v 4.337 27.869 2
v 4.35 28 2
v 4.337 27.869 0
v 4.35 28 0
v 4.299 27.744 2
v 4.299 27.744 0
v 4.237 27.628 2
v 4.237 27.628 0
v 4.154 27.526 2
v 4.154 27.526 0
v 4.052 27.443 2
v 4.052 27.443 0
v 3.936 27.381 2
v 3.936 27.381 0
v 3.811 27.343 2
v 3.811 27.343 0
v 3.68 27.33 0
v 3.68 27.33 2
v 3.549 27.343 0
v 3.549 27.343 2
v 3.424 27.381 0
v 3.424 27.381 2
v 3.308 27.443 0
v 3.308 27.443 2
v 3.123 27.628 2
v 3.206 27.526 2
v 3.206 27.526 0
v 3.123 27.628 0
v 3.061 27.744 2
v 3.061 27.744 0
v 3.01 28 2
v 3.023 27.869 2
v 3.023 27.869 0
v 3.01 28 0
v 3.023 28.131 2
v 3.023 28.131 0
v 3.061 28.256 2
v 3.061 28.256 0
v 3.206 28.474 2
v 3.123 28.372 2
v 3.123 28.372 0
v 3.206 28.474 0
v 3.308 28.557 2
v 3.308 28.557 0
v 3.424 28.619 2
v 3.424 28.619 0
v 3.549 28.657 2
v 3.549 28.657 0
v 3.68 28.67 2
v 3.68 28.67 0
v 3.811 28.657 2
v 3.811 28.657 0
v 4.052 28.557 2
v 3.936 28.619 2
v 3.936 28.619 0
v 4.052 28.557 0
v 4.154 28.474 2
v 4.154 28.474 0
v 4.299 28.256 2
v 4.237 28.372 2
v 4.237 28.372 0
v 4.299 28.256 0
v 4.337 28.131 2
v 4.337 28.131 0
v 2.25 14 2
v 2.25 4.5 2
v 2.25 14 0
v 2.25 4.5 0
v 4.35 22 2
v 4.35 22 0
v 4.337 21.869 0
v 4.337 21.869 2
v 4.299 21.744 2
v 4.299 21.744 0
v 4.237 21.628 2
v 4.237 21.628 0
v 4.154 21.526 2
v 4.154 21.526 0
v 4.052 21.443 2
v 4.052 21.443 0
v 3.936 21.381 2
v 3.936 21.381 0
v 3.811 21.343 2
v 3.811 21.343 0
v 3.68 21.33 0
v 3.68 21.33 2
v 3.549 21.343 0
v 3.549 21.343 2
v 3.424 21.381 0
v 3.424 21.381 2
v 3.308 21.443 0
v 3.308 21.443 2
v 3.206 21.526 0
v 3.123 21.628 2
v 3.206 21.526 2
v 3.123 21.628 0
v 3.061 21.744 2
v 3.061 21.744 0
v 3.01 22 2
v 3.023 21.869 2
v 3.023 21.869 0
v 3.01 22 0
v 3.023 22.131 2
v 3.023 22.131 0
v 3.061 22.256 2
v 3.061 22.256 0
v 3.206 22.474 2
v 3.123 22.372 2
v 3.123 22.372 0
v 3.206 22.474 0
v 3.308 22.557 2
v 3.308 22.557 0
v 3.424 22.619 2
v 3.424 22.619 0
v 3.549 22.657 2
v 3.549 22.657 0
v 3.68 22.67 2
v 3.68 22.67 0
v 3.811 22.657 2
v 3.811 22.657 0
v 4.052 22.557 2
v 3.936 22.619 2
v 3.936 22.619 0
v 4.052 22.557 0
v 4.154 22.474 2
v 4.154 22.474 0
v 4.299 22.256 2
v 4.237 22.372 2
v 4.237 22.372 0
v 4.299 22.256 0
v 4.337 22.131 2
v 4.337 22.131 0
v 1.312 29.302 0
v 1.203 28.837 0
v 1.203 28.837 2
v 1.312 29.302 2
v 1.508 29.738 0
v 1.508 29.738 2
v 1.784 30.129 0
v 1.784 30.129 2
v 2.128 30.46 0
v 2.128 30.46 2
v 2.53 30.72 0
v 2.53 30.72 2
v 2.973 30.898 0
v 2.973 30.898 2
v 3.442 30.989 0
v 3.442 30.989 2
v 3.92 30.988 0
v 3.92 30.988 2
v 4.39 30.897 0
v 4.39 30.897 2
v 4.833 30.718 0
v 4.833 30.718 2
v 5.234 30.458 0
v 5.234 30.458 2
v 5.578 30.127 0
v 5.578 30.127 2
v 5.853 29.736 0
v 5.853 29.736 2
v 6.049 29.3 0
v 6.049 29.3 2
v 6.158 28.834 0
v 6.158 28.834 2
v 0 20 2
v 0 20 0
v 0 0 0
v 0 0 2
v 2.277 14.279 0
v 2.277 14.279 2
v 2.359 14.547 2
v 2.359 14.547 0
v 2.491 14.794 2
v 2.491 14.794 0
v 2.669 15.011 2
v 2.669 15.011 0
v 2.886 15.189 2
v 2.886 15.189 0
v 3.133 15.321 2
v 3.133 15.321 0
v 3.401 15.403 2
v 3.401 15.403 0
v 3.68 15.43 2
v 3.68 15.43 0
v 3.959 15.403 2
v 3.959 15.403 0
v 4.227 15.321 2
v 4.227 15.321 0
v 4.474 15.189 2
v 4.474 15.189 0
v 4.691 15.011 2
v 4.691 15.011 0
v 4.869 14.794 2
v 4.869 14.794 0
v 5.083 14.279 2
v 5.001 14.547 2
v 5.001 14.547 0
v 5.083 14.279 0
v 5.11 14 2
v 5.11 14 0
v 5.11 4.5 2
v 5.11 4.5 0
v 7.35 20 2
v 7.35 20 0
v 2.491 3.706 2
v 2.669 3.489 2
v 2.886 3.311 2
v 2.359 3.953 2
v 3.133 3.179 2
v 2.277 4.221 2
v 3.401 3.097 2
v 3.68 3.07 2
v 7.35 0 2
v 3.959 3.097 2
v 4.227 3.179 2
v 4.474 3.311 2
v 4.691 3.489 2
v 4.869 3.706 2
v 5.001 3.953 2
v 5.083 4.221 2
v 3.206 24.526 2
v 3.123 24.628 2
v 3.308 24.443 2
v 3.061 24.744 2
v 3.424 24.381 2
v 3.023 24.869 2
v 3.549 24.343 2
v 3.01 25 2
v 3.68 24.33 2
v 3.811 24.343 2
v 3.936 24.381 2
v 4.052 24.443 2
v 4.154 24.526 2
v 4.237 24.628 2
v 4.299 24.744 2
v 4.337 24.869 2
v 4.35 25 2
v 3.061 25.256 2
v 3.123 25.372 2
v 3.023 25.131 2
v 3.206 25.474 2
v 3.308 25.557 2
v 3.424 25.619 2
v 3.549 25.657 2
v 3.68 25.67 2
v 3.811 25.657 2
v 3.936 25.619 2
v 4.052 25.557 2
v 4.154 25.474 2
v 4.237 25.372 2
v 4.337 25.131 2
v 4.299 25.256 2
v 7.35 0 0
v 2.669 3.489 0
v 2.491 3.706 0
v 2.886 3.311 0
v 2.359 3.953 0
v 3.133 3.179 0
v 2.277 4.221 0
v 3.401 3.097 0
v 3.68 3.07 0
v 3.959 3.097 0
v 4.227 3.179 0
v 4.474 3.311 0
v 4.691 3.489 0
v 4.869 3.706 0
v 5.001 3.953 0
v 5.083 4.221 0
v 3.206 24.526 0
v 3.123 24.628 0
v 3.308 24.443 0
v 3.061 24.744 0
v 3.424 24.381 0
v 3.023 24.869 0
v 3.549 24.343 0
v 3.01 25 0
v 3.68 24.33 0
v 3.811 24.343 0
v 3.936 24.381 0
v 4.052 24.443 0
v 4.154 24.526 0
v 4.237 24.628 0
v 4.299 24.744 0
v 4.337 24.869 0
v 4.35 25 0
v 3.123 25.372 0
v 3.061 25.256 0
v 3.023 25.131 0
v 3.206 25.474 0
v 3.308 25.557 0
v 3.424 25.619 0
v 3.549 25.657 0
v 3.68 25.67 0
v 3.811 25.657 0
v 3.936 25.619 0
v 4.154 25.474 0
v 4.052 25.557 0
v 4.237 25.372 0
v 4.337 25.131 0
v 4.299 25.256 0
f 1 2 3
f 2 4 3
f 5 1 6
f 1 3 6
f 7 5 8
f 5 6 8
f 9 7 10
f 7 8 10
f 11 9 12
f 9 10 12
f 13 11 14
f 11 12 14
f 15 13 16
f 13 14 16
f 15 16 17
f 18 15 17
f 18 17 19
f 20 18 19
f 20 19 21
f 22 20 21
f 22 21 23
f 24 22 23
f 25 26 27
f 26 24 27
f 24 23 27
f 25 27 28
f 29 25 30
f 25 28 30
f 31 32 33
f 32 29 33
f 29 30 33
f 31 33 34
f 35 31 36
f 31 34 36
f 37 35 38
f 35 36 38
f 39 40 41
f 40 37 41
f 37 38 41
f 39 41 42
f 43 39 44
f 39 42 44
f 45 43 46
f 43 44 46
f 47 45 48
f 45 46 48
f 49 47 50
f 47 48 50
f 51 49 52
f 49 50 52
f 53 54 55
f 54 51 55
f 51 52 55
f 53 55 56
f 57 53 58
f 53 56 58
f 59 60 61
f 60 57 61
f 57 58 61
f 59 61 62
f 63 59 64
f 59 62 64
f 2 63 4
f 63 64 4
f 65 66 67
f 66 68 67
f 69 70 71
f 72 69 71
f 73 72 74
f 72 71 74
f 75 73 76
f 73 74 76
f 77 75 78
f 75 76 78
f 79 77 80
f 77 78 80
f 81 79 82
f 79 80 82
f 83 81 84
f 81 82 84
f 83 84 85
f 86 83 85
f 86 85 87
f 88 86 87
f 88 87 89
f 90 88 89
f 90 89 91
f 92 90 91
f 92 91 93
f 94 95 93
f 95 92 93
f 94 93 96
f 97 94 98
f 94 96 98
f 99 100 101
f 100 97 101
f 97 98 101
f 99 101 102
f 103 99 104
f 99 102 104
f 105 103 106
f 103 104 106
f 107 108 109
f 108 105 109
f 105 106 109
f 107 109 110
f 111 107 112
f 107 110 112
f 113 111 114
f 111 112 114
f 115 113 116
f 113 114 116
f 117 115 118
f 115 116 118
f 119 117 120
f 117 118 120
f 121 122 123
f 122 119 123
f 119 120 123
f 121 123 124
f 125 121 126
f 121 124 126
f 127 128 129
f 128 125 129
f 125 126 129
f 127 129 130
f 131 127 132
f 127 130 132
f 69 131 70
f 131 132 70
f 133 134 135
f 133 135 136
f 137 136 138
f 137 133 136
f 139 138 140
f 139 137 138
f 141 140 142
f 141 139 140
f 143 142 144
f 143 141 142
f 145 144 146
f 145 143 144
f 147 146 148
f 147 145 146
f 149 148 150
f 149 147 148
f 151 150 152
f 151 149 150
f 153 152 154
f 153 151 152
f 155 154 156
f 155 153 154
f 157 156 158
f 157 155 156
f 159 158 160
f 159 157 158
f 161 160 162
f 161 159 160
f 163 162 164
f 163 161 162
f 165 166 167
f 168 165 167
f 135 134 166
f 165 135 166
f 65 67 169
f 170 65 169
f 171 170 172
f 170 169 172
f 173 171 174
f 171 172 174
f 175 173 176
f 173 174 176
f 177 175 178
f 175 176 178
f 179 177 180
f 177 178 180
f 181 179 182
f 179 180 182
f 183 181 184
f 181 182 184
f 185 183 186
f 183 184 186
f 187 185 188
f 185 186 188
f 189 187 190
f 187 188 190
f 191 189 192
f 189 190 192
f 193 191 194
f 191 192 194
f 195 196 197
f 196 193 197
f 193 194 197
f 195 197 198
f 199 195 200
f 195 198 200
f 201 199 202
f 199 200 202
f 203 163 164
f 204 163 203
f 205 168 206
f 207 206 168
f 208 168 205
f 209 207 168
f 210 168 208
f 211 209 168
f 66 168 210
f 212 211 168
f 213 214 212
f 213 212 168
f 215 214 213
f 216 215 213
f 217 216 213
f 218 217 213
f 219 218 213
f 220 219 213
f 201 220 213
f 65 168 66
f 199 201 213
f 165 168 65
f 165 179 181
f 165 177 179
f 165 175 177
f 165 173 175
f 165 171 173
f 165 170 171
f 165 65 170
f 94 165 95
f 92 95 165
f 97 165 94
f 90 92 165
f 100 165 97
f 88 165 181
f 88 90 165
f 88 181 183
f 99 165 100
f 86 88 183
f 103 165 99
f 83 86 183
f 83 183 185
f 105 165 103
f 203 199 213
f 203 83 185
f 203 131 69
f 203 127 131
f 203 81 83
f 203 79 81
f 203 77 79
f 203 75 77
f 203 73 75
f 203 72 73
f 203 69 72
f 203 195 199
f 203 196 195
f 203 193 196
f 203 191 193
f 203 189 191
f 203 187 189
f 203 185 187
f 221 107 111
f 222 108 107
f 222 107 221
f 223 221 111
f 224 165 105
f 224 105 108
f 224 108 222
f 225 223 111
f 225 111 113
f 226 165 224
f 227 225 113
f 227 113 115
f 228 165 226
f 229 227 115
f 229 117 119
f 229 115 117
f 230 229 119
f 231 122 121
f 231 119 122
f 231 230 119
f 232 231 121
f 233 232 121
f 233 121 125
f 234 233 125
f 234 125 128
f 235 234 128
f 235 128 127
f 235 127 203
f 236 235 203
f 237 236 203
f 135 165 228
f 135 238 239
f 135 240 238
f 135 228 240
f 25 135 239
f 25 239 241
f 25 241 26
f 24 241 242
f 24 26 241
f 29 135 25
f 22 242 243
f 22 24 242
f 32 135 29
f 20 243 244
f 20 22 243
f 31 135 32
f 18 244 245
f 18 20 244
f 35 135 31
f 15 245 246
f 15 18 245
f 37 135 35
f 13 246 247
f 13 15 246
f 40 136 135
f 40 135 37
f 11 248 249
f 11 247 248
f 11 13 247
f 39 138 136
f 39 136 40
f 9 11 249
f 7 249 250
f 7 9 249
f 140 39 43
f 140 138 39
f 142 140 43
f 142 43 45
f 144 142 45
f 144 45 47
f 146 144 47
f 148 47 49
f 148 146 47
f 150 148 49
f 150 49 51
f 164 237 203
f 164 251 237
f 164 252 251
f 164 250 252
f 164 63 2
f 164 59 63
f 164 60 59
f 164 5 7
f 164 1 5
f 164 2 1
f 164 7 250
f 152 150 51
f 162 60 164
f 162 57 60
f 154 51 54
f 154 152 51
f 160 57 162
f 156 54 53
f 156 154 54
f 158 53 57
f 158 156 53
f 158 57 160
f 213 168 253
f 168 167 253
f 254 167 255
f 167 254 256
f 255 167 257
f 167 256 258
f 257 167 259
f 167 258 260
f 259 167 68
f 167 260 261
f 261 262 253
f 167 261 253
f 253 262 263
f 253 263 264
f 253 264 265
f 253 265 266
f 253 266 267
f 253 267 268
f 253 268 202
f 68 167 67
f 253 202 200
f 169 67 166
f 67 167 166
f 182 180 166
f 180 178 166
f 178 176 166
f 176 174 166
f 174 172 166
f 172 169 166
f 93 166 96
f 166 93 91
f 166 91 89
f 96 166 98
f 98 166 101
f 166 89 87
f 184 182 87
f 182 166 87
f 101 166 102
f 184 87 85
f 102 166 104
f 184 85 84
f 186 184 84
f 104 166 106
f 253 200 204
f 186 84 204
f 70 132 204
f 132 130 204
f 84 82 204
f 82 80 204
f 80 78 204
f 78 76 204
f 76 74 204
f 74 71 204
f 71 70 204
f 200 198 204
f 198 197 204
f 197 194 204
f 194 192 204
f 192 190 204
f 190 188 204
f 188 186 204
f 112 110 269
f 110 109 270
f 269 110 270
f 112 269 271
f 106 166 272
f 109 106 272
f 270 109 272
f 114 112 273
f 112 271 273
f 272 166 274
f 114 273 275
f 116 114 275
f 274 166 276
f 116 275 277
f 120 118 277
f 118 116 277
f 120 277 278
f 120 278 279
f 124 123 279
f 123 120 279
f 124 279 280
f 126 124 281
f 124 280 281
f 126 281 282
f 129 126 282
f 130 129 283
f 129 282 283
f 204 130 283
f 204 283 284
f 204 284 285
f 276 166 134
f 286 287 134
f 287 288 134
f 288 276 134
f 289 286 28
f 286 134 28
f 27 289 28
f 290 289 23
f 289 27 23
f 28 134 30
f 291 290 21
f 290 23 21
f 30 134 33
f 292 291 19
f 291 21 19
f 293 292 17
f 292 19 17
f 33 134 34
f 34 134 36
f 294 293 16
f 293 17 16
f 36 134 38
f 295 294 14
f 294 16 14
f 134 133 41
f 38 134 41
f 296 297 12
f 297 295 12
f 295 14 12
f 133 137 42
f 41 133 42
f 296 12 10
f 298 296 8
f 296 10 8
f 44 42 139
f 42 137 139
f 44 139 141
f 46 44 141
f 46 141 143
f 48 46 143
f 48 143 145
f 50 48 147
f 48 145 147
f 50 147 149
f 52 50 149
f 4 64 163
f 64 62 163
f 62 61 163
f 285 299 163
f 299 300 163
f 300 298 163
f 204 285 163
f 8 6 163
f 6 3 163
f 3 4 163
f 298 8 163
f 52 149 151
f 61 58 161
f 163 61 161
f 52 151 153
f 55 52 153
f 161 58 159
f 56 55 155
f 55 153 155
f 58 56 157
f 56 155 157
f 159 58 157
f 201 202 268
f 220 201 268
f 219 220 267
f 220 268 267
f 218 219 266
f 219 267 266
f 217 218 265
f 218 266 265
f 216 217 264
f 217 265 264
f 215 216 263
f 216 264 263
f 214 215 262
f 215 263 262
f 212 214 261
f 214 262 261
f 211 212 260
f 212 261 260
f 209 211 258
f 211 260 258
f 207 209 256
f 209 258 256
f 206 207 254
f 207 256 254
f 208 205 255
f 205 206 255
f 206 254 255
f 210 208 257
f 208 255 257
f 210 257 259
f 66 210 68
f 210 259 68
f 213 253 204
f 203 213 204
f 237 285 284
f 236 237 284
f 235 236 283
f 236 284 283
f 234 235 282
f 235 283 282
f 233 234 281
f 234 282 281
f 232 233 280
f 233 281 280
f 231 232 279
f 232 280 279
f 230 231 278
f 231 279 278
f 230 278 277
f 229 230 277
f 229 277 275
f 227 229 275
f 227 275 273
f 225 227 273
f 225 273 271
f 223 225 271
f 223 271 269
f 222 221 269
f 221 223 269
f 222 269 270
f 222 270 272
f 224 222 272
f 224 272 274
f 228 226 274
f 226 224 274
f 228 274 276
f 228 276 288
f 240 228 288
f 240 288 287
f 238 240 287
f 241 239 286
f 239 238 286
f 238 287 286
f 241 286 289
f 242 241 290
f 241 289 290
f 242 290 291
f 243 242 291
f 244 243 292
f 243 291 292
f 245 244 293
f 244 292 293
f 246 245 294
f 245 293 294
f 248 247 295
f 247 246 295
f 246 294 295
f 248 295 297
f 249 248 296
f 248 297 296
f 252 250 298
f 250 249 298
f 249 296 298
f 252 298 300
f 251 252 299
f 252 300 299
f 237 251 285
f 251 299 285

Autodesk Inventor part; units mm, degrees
ref_plane "YZ Plane" through (0, 0, 0) normal (1, 0, 0) x (0, 1, 0)
ref_plane "XZ Plane" through (0, 0, 0) normal (0, 1, 0) x (-1, 0, 0)
ref_plane "XY Plane" through (0, 0, 0) normal (0, 0, 1) x (1, 0, 0)
sketch "Sketch1" plane through (0, 0, 0) normal (0, 0, 1) x (1, 0, 0)
  line L0 (0, 0) -> (7.35, 0)
  line L1 (7.35, 0) -> (7.35, 20)
  line L2 (7.35, 20) -> (0, 20)
  line L3 (0, 20) -> (0, 0)
  circle A0 centre (3.68, 28.5) radius 2.5
  line L4 (1.2028, 28.8372) -> (0, 20)
  line L5 (6.1575, 28.8344) -> (7.35, 20)
  circle A1 centre (3.68, 28) radius 0.67
  circle A2 centre (3.68, 4.5) radius 1.43
  circle A3 centre (3.68, 14) radius 1.43
  circle A4 centre (3.68, 25) radius 0.67
  circle A5 centre (3.68, 22) radius 0.67
  line L6 (2.25, 4.5) -> (2.25, 14)
  line L7 (5.11, 14) -> (5.11, 4.5)
  point P0 (5.11, 4.5)
  dimension "d0" = 7.35
  dimension "d1" = 20
  dimension "d2" = 5
  dimension "d3" = 28.5
  dimension "d4" = 3.68
  dimension "d5" = 1.34
  dimension "d6" = 2.86
  dimension "d7" = 2.86
  dimension "d8" = 1.34
  dimension "d9" = 1.34
  dimension "d10" = 28
  dimension "d11" = 3.68
  dimension "d12" = 25
  dimension "d13" = 3.68
  dimension "d14" = 3.68
  dimension "d15" = 22
  dimension "d16" = 14
  dimension "d17" = 4.5
  dimension "d18" = 3.68
  dimension "d19" = 3.68
extrude "Extrusion1" add sketch "Sketch1" along normal blind 2
properties part number "Standard Servo Horn - Linear Arm"
